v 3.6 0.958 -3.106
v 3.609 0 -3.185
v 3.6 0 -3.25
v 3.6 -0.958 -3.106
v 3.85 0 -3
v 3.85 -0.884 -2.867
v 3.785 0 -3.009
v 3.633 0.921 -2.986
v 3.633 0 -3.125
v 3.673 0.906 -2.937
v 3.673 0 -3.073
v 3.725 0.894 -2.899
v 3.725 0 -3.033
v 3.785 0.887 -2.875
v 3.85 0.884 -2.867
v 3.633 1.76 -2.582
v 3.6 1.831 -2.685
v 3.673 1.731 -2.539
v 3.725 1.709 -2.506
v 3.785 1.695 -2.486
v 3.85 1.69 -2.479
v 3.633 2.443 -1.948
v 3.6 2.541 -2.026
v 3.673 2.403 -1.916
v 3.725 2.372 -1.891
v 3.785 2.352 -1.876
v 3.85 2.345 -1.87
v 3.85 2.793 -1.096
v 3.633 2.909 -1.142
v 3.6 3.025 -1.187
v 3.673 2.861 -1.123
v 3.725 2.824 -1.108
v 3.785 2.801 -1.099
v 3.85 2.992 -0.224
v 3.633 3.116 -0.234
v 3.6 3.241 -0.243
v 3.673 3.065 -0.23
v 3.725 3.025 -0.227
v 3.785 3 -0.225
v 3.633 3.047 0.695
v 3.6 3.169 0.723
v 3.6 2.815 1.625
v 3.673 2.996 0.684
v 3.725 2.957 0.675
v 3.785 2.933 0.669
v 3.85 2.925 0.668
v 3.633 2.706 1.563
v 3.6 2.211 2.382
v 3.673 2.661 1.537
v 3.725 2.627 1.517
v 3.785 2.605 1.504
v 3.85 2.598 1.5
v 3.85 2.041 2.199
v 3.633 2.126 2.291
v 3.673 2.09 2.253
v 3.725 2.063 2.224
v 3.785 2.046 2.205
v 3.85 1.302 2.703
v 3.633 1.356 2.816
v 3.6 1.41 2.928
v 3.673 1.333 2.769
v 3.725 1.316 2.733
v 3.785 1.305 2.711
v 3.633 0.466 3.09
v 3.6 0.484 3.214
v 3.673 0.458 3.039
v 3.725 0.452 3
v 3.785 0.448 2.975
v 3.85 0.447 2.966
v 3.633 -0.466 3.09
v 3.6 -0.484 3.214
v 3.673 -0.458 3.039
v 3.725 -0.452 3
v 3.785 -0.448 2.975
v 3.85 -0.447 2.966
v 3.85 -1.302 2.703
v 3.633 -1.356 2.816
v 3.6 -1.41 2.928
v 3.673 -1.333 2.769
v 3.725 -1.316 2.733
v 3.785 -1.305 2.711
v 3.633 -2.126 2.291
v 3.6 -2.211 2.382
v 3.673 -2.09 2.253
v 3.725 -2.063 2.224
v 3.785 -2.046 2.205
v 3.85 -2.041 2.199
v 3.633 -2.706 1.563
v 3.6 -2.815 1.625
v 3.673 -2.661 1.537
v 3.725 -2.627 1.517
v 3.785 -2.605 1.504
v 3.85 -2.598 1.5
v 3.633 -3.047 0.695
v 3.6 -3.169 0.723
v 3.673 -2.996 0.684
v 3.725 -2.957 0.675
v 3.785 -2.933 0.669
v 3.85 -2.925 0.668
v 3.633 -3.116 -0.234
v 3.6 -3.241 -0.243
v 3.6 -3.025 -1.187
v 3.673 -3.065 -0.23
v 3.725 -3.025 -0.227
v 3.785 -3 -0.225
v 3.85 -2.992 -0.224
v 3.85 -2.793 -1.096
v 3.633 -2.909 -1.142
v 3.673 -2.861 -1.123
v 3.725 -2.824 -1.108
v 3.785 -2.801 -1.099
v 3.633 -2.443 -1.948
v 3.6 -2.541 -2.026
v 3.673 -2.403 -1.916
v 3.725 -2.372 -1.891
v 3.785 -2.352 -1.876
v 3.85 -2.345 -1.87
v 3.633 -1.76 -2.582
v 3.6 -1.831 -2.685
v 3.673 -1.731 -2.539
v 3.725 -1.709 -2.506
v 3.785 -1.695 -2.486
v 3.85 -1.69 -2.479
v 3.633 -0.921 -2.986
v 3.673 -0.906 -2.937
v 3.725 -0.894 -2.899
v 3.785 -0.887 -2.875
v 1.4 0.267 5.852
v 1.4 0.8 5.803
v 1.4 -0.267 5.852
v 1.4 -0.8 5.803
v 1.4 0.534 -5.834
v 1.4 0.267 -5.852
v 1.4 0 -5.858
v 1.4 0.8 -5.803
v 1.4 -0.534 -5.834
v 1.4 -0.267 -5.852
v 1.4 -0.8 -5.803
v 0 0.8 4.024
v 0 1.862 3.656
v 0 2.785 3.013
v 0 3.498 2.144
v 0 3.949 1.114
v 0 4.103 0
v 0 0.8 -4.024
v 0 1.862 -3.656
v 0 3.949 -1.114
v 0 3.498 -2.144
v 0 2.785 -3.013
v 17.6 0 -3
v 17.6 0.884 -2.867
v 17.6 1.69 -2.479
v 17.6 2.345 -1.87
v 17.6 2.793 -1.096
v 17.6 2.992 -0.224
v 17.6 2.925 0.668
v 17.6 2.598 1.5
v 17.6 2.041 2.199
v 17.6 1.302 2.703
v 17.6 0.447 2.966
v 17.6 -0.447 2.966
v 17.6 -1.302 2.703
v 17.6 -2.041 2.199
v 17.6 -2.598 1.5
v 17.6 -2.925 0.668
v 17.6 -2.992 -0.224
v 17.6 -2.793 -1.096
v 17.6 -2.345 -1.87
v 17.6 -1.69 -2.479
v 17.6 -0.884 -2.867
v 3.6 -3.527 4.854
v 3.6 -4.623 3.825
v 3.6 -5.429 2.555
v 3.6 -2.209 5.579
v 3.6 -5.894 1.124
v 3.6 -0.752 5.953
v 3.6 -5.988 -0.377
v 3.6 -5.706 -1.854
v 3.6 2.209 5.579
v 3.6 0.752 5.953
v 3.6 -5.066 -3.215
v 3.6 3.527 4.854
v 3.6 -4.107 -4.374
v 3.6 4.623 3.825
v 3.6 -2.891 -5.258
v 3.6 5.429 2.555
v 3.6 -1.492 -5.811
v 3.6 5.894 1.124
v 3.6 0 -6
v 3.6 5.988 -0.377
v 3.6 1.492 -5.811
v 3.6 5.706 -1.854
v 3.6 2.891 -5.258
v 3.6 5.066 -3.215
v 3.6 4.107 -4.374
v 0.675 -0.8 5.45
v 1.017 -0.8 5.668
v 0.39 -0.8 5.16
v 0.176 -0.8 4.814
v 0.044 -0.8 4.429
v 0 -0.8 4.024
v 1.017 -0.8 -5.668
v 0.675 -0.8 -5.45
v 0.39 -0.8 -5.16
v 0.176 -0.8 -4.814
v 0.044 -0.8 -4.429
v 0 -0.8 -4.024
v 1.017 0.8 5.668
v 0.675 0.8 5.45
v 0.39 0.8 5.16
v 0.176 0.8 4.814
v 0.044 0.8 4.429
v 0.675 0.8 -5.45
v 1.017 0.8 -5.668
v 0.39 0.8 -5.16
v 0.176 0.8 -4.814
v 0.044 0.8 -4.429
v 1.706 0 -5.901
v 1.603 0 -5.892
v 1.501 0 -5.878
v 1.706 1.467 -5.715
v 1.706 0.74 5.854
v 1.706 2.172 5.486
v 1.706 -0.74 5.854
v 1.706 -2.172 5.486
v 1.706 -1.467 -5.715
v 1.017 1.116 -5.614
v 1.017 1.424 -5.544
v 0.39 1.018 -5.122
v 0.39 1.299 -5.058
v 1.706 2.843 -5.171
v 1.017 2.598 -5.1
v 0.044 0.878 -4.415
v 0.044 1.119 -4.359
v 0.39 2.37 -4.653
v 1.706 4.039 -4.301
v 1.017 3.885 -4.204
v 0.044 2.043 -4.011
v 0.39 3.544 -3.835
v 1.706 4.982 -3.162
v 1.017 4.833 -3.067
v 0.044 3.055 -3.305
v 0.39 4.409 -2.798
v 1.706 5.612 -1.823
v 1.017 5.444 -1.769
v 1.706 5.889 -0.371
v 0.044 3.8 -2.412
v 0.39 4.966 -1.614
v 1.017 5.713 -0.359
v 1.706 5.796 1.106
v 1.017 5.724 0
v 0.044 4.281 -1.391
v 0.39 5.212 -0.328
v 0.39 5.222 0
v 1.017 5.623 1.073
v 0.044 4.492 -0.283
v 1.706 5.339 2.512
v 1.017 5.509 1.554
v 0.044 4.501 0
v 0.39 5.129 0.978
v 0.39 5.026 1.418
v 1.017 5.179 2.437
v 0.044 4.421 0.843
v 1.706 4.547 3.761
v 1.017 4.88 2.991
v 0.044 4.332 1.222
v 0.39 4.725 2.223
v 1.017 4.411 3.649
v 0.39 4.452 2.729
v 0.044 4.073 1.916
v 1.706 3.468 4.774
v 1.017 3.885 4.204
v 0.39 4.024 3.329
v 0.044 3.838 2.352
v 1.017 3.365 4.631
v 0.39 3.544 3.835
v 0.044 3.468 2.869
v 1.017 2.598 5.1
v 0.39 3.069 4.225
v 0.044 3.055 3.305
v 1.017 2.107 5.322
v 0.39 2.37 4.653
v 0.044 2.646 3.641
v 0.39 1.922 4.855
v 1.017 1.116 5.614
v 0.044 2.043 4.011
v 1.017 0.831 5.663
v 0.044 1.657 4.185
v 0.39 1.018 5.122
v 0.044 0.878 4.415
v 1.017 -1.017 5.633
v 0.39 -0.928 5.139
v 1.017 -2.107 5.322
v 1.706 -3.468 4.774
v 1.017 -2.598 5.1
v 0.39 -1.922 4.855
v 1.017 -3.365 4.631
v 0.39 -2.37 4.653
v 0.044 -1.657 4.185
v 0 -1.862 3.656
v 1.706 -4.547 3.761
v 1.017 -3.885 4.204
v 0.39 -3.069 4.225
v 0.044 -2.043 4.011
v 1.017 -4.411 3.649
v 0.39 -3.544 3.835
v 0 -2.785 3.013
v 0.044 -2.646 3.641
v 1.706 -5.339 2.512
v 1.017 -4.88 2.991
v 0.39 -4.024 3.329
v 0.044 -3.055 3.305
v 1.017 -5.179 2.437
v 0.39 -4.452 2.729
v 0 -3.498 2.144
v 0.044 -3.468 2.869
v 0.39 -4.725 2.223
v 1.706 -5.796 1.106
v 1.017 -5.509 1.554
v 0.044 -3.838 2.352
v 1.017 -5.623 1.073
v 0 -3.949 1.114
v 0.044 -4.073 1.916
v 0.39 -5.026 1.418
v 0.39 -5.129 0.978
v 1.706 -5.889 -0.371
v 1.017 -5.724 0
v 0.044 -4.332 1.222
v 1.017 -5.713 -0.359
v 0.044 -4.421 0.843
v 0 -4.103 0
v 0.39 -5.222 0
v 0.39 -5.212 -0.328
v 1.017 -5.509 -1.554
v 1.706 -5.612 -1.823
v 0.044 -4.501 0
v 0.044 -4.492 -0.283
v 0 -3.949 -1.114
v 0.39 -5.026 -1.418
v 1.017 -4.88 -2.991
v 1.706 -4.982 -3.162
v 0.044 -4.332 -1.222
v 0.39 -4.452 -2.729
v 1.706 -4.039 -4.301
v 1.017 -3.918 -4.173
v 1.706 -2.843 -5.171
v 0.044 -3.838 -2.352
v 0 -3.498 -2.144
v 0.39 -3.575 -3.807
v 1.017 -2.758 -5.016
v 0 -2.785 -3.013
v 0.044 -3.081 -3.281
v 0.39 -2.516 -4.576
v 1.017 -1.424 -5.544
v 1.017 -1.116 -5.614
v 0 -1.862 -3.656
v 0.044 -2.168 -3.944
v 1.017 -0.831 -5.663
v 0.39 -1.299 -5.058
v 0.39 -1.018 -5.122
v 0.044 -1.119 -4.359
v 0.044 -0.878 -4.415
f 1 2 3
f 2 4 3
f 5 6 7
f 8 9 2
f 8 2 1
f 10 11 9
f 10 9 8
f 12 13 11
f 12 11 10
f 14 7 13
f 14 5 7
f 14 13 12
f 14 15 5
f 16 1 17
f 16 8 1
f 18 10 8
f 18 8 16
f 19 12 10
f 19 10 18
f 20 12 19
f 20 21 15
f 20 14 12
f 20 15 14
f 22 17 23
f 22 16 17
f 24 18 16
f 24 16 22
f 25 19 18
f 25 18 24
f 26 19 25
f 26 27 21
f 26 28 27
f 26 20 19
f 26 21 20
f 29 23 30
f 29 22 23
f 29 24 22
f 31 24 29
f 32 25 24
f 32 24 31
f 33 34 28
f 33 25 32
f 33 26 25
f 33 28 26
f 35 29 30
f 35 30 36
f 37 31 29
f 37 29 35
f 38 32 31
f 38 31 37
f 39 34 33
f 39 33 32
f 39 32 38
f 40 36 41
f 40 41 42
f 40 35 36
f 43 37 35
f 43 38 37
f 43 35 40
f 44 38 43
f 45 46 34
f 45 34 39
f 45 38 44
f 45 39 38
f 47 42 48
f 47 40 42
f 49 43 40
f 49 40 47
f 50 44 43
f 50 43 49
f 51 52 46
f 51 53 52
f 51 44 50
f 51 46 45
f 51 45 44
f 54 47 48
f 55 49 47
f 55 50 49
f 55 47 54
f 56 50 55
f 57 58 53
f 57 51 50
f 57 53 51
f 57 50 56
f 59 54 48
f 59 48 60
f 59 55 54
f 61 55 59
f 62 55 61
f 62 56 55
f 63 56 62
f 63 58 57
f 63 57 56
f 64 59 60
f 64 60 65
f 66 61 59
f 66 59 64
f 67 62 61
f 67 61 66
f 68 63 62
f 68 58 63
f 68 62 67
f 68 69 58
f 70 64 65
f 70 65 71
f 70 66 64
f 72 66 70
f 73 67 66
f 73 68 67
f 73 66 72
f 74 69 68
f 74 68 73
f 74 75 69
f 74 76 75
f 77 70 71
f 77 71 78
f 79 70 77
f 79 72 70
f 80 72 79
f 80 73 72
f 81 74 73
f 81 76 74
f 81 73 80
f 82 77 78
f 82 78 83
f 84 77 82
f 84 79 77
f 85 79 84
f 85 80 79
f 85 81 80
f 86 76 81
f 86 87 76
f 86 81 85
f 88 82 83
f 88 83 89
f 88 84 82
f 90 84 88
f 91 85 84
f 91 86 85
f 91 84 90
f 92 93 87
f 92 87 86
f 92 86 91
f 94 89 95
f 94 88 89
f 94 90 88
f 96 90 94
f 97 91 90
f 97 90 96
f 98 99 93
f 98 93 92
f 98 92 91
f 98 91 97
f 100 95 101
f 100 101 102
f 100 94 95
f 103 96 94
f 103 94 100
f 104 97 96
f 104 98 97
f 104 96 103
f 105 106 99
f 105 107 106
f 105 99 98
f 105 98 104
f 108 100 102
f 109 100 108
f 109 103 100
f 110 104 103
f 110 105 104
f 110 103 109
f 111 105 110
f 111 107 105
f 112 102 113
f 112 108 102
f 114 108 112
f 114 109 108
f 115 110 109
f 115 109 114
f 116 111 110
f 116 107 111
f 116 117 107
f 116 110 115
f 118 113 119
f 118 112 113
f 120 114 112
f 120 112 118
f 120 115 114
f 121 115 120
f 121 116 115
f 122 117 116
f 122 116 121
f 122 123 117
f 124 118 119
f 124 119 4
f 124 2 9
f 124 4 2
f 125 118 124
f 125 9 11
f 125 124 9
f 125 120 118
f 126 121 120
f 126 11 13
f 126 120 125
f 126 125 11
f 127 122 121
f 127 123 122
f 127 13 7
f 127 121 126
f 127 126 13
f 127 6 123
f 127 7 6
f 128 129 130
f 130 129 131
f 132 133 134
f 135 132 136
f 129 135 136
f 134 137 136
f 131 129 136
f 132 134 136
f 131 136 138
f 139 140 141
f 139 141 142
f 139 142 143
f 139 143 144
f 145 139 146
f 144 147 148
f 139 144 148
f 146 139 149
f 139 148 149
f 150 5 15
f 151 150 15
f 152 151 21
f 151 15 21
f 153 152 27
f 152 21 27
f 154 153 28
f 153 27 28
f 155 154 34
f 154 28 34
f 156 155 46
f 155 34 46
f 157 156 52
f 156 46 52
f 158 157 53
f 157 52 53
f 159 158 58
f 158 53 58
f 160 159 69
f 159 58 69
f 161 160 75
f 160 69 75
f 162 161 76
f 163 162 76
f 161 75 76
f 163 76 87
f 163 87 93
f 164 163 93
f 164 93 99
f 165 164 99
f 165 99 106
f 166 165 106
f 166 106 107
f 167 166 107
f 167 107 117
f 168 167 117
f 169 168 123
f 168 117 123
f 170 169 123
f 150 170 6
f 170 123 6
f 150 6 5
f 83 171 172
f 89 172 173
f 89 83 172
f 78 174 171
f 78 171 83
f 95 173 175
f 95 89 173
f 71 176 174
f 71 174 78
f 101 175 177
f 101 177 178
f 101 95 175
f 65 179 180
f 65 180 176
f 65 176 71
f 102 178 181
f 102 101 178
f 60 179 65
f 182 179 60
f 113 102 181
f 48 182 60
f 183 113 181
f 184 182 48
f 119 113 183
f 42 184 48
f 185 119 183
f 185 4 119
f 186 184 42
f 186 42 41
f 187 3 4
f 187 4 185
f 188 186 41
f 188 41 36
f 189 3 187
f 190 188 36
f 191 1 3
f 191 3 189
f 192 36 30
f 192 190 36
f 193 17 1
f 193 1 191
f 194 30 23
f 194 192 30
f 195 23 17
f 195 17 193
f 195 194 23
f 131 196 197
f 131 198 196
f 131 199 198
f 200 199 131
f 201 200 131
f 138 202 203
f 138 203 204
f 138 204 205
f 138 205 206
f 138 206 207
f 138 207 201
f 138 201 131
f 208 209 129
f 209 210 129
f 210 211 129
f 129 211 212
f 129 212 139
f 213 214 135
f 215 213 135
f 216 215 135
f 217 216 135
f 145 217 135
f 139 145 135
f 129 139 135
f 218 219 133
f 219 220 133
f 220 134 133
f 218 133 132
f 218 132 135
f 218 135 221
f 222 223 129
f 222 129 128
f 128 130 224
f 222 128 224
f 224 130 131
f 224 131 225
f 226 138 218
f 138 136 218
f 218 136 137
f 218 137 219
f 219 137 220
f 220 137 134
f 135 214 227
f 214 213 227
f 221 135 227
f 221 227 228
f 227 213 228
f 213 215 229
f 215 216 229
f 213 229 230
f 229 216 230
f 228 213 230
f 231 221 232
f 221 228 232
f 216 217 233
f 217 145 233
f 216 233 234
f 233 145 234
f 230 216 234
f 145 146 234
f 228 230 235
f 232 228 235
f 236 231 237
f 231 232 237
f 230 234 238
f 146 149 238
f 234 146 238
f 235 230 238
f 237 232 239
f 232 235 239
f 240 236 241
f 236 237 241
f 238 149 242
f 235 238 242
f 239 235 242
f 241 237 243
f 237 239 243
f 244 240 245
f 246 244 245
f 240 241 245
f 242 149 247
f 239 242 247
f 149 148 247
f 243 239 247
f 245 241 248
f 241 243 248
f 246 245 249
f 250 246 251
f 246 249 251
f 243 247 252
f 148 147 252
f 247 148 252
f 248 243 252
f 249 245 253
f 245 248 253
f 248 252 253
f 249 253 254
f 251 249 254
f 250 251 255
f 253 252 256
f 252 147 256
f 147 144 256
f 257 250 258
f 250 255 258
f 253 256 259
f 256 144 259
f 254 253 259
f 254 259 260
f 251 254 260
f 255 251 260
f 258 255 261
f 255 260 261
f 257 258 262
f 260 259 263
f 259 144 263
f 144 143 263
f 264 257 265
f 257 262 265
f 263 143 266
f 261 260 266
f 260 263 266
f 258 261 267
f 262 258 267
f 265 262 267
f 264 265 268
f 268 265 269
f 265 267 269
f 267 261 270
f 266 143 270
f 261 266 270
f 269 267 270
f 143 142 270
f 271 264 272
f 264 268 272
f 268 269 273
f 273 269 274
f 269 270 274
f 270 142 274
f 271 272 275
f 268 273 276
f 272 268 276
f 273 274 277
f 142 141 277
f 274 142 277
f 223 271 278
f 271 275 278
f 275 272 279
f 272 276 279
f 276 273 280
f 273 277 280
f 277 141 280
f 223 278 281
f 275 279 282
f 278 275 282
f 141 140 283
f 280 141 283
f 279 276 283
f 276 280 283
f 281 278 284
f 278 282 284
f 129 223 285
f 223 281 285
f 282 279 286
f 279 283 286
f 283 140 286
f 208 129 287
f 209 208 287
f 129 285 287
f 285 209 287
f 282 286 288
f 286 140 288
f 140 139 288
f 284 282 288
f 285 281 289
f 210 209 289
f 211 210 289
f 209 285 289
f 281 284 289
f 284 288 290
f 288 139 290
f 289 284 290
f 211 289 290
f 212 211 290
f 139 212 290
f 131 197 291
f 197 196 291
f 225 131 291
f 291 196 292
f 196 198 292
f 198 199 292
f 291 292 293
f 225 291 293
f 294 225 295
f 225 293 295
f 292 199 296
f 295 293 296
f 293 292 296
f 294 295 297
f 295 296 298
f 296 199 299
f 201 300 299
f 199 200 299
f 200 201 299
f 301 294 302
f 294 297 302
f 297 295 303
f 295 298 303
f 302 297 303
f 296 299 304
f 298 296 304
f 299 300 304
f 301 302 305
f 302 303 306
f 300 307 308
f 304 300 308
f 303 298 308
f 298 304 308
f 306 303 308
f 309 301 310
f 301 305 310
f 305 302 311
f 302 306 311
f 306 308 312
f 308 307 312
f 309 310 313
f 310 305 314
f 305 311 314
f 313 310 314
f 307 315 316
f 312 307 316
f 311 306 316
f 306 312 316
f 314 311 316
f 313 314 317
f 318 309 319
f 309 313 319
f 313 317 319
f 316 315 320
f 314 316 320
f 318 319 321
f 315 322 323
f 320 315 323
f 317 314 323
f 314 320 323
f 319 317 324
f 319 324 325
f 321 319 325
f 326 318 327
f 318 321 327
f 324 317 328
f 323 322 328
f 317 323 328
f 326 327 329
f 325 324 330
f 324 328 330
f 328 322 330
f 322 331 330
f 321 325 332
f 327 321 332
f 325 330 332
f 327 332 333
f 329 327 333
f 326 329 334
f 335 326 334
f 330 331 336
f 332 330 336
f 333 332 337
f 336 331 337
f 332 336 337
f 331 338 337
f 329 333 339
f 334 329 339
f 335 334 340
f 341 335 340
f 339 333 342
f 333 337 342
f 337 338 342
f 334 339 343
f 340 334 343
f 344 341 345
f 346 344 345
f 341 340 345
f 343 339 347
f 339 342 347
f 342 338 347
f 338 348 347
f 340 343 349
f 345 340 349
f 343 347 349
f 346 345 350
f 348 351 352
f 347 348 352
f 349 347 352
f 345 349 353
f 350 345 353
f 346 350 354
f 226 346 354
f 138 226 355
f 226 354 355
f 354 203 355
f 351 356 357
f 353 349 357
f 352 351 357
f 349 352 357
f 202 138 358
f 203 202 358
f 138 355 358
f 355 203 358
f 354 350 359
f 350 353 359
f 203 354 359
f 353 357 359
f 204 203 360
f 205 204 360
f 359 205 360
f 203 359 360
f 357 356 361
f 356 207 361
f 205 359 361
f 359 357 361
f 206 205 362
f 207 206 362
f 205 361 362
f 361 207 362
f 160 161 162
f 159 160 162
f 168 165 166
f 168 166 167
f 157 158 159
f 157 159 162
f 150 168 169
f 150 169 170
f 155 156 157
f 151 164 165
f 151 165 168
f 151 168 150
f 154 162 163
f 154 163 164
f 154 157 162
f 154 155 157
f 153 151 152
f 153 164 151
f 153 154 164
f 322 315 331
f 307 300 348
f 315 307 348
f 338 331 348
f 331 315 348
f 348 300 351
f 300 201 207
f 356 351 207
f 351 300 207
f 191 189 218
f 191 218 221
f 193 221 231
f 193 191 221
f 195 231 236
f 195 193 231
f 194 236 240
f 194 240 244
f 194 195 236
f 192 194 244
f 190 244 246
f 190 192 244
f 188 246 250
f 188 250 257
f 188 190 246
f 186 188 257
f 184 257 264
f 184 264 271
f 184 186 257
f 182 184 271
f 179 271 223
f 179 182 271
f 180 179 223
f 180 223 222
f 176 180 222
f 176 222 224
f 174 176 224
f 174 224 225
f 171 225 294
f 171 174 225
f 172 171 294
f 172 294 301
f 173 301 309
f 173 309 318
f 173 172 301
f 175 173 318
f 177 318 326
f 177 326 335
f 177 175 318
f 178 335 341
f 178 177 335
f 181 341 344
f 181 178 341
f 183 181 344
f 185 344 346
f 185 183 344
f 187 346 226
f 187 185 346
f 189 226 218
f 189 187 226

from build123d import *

# Parameters (mm, degrees)
SKETCH1_R        = 6
BASEHEAD_DEPTH   = 3.6
BASEHEAD_DRAFT   = -3
SKETCH2_R        = 3
BASEBODY_DEPTH   = 14
HEADFILLET2_R    = 1.8
NOTCH_DEPTH      = 19.96325394
NOTCH_DEPTH_BACK = 19.96325394
SKETCH3_W        = 1.6
SKETCH3_H        = 1.4
HEADFILLET1_R    = 0.25


with BuildPart() as part:
    # Sketch1 → BaseHead (with draft: the straight prism first)
    with BuildSketch(Plane(origin=(3.6, 0, 0), x_dir=(0, 0, -1), z_dir=(1, 0, 0))):
        Circle(SKETCH1_R)
    extrude(amount=-BASEHEAD_DEPTH)
    # BaseHead: the draft: its side faces are tilted about the plane it starts from
    basehead_sides = [part.faces().sort_by_distance(p)[0] for p in [
        (1.8, 0, 6),
    ]]
    draft(basehead_sides, Plane(origin=(3.6, 0, 0), x_dir=(0, 0, -1), z_dir=(1, 0, 0)), BASEHEAD_DRAFT)

    # Sketch2 → BaseBody (add)
    with BuildSketch(Plane(origin=(3.6, 0, 0), x_dir=(0, 0, -1), z_dir=(1, 0, 0))):
        Circle(SKETCH2_R)
    extrude(amount=BASEBODY_DEPTH)

    # HeadFillet2
    headfillet2_edges = [part.edges().sort_by_distance(p)[0] for p in [
        (0, 0, 5.811331995),
    ]]
    fillet(headfillet2_edges, radius=HEADFILLET2_R)

    # Sketch3 → Notch (cut, two sides: drawn at the far end of the back side and taken through both)
    with BuildSketch(Plane(origin=(1.05, -1.05, 0), x_dir=(0, -1, 0), z_dir=(0, 0, 1)).offset(-NOTCH_DEPTH_BACK)):
        with Locations((-1.05, -0.35)):
            Rectangle(SKETCH3_W, SKETCH3_H)
    extrude(amount=NOTCH_DEPTH + NOTCH_DEPTH_BACK, mode=Mode.SUBTRACT)

    # HeadFillet1
    headfillet1_edges = [part.edges().sort_by_distance(p)[0] for p in [
        (3.6, 0, 3),
    ]]
    fillet(headfillet1_edges, radius=HEADFILLET1_R)


solid = part.part
